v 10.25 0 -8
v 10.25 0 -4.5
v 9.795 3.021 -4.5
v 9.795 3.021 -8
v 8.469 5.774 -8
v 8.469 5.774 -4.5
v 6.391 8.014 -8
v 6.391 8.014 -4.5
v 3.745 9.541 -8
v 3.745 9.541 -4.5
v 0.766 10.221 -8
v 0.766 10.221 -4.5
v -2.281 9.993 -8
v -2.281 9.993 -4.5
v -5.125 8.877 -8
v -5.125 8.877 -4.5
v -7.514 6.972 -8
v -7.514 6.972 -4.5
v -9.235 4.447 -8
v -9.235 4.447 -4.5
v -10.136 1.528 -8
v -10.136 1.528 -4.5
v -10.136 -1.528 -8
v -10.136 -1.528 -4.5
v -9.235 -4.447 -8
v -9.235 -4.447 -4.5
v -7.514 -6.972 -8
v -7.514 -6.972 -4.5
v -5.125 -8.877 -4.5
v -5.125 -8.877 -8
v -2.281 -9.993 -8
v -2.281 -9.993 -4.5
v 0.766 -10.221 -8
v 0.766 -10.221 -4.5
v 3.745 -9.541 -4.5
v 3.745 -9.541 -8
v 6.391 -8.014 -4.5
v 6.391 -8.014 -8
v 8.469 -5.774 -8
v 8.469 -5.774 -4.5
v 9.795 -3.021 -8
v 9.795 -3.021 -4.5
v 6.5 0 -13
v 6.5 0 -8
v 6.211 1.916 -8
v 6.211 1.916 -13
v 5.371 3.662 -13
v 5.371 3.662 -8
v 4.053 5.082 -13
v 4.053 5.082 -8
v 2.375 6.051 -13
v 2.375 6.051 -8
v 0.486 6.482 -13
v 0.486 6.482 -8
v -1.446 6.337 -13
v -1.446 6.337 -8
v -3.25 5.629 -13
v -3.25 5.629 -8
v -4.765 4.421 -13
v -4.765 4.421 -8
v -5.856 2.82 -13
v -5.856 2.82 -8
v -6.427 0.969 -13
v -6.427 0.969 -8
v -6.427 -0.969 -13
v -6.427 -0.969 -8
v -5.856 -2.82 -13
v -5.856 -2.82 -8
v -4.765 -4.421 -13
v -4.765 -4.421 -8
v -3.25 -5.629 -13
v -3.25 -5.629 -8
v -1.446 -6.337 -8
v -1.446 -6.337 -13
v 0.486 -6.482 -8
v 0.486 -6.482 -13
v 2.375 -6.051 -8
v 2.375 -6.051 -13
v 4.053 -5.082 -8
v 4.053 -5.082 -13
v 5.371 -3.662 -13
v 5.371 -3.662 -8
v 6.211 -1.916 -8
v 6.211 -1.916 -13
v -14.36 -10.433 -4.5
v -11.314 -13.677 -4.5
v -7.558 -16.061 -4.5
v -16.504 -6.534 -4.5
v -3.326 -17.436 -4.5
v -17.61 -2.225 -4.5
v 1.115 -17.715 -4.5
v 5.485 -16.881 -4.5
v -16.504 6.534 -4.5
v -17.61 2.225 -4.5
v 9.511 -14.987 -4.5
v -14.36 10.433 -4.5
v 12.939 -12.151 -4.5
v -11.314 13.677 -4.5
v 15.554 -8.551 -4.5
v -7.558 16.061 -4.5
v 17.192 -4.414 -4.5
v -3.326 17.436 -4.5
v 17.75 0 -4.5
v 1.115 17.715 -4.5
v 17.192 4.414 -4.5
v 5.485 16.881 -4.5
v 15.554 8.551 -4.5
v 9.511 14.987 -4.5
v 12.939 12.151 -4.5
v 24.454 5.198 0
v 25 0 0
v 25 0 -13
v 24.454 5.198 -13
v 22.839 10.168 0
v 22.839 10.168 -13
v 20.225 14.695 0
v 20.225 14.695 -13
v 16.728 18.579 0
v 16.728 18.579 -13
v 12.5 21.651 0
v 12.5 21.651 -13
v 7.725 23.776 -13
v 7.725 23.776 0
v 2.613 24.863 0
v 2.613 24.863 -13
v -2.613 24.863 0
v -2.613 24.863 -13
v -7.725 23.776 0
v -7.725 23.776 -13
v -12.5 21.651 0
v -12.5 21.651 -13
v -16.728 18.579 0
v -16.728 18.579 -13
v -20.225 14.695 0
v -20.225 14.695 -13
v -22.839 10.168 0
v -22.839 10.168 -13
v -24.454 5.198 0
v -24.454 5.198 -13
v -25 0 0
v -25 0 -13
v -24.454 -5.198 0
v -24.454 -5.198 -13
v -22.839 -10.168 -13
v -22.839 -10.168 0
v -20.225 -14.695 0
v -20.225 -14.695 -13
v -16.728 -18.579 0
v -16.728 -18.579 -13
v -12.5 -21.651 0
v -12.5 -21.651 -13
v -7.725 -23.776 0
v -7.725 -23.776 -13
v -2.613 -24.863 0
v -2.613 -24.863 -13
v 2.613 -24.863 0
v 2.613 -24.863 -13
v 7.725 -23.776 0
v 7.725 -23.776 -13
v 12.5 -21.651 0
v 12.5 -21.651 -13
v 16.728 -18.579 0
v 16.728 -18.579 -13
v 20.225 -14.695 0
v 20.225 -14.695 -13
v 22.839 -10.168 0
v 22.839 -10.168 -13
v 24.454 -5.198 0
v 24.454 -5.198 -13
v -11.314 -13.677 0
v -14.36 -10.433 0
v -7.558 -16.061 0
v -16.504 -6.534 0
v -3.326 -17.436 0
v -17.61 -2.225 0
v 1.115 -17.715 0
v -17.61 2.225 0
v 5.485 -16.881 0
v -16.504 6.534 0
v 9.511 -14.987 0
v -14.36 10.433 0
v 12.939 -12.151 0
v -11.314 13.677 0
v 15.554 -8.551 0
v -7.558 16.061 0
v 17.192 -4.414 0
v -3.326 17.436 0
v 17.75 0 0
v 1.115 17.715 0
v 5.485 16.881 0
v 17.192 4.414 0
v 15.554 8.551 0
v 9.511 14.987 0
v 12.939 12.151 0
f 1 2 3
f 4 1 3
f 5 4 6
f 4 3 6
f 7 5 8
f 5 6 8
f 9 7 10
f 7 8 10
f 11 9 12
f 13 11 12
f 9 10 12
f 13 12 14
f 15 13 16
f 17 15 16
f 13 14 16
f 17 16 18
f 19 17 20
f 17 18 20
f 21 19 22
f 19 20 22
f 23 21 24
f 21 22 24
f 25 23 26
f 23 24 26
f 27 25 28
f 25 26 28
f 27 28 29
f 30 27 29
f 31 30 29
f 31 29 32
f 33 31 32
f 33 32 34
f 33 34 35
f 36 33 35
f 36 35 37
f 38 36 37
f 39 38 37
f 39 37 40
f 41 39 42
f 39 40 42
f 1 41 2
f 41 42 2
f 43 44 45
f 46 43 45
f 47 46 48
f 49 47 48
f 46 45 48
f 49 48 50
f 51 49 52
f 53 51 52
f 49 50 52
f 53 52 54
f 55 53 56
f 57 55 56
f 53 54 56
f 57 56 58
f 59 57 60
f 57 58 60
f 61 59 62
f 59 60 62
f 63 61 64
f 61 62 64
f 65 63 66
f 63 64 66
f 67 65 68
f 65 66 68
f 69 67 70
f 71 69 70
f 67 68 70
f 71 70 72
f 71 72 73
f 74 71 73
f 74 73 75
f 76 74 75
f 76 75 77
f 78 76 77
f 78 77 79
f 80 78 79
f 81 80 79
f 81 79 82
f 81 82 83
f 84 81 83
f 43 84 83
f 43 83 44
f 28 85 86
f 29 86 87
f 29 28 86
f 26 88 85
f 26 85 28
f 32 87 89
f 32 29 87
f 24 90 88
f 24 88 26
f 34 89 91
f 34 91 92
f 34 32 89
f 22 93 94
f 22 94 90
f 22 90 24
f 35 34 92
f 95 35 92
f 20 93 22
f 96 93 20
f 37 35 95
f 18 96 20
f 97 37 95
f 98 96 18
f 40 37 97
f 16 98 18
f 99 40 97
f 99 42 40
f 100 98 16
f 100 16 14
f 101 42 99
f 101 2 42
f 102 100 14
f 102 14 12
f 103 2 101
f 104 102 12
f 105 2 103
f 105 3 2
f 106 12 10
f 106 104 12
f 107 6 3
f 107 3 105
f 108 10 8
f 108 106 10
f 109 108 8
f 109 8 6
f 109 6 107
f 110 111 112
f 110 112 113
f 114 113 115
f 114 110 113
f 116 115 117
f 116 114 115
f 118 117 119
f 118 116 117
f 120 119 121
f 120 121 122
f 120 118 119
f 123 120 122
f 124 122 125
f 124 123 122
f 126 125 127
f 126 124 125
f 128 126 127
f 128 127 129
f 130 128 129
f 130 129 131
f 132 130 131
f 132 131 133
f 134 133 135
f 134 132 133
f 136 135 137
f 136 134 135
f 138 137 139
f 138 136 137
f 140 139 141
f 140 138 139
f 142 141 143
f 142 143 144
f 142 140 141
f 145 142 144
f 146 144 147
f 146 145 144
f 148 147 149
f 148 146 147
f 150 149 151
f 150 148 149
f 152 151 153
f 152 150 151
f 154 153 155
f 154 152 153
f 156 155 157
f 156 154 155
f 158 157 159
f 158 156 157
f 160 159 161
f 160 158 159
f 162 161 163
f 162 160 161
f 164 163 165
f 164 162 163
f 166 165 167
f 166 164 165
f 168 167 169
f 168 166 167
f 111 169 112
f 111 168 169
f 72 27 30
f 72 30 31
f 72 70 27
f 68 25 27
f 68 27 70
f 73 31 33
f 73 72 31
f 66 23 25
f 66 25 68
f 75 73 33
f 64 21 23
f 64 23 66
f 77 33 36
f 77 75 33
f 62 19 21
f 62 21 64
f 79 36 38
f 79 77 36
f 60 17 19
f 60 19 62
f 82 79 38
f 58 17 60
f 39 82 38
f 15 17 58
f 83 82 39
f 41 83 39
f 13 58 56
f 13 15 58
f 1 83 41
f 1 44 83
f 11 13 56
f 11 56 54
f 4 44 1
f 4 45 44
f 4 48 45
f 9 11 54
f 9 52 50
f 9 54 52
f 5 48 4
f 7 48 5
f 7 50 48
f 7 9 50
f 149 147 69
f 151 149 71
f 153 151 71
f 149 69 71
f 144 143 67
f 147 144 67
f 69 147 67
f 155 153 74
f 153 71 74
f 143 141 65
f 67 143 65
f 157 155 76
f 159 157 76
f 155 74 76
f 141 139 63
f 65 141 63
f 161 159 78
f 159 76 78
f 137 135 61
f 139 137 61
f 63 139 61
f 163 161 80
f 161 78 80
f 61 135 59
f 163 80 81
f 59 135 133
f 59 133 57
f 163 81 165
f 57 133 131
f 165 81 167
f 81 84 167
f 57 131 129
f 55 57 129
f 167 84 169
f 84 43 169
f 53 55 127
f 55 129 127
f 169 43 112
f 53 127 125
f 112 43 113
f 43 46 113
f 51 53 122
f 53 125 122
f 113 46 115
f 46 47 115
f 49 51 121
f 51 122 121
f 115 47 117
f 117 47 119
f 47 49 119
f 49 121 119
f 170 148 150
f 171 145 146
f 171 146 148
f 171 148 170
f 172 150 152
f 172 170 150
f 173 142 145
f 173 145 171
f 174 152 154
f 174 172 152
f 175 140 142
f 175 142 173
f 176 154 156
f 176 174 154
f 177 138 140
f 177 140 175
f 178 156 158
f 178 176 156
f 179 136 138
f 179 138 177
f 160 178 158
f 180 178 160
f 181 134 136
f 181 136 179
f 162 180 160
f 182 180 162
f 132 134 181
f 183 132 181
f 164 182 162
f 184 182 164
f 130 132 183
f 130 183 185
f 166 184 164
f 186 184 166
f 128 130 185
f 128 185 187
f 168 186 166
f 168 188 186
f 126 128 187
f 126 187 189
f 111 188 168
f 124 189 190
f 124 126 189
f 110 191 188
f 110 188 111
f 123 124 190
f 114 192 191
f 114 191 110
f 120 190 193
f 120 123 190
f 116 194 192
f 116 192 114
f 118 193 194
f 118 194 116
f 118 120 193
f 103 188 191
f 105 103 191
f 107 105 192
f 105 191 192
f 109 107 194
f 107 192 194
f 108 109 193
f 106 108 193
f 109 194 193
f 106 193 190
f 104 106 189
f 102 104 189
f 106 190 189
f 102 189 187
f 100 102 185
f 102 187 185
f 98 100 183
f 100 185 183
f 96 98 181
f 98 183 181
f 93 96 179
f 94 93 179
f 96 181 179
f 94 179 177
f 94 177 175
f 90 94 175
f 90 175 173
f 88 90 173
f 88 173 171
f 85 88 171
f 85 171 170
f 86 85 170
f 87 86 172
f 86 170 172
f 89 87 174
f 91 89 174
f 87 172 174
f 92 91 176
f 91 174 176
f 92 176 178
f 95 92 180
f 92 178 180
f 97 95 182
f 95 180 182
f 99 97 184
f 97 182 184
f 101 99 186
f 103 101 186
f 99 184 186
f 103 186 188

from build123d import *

# Parameters (mm, degrees)
CROQUIS1_R              = 25
SALIENTE_EXTRUIR1_DEPTH = 13
CROQUIS2_R              = 17.75
CORTAR_EXTRUIR1_DEPTH   = 4.5
CROQUIS3_R              = 10.25
CORTAR_EXTRUIR2_DEPTH   = 3.5
CORTAR_EXTRUIR3_REACH   = 38.249
CROQUIS4_R              = 6.5


with BuildPart() as part:
    # Croquis1 → Saliente-Extruir1 (new body)
    with BuildSketch(Plane.XY):
        Circle(CROQUIS1_R)
    extrude(amount=-SALIENTE_EXTRUIR1_DEPTH)

    # Croquis2 → Cortar-Extruir1 (cut)
    with BuildSketch(Plane.XY):
        Circle(CROQUIS2_R)
    extrude(amount=-CORTAR_EXTRUIR1_DEPTH, mode=Mode.SUBTRACT)

    # Croquis3 → Cortar-Extruir2 (cut)
    with BuildSketch(Plane.XY.offset(-4.5)):
        Circle(CROQUIS3_R)
    extrude(amount=-CORTAR_EXTRUIR2_DEPTH, mode=Mode.SUBTRACT)

    # Croquis4 → Cortar-Extruir3 (cut, up to next)
    with BuildSketch(Plane.XY.offset(-8), mode=Mode.PRIVATE) as cortar_extruir3_sk1:
        Circle(CROQUIS4_R)
    cortar_extruir3_tool1 = extrude(cortar_extruir3_sk1.sketch, amount=-CORTAR_EXTRUIR3_REACH, mode=Mode.PRIVATE) & part.part
    add(cortar_extruir3_tool1.solids().sort_by_distance((0, 0, -8))[0], mode=Mode.SUBTRACT)


solid = part.part
